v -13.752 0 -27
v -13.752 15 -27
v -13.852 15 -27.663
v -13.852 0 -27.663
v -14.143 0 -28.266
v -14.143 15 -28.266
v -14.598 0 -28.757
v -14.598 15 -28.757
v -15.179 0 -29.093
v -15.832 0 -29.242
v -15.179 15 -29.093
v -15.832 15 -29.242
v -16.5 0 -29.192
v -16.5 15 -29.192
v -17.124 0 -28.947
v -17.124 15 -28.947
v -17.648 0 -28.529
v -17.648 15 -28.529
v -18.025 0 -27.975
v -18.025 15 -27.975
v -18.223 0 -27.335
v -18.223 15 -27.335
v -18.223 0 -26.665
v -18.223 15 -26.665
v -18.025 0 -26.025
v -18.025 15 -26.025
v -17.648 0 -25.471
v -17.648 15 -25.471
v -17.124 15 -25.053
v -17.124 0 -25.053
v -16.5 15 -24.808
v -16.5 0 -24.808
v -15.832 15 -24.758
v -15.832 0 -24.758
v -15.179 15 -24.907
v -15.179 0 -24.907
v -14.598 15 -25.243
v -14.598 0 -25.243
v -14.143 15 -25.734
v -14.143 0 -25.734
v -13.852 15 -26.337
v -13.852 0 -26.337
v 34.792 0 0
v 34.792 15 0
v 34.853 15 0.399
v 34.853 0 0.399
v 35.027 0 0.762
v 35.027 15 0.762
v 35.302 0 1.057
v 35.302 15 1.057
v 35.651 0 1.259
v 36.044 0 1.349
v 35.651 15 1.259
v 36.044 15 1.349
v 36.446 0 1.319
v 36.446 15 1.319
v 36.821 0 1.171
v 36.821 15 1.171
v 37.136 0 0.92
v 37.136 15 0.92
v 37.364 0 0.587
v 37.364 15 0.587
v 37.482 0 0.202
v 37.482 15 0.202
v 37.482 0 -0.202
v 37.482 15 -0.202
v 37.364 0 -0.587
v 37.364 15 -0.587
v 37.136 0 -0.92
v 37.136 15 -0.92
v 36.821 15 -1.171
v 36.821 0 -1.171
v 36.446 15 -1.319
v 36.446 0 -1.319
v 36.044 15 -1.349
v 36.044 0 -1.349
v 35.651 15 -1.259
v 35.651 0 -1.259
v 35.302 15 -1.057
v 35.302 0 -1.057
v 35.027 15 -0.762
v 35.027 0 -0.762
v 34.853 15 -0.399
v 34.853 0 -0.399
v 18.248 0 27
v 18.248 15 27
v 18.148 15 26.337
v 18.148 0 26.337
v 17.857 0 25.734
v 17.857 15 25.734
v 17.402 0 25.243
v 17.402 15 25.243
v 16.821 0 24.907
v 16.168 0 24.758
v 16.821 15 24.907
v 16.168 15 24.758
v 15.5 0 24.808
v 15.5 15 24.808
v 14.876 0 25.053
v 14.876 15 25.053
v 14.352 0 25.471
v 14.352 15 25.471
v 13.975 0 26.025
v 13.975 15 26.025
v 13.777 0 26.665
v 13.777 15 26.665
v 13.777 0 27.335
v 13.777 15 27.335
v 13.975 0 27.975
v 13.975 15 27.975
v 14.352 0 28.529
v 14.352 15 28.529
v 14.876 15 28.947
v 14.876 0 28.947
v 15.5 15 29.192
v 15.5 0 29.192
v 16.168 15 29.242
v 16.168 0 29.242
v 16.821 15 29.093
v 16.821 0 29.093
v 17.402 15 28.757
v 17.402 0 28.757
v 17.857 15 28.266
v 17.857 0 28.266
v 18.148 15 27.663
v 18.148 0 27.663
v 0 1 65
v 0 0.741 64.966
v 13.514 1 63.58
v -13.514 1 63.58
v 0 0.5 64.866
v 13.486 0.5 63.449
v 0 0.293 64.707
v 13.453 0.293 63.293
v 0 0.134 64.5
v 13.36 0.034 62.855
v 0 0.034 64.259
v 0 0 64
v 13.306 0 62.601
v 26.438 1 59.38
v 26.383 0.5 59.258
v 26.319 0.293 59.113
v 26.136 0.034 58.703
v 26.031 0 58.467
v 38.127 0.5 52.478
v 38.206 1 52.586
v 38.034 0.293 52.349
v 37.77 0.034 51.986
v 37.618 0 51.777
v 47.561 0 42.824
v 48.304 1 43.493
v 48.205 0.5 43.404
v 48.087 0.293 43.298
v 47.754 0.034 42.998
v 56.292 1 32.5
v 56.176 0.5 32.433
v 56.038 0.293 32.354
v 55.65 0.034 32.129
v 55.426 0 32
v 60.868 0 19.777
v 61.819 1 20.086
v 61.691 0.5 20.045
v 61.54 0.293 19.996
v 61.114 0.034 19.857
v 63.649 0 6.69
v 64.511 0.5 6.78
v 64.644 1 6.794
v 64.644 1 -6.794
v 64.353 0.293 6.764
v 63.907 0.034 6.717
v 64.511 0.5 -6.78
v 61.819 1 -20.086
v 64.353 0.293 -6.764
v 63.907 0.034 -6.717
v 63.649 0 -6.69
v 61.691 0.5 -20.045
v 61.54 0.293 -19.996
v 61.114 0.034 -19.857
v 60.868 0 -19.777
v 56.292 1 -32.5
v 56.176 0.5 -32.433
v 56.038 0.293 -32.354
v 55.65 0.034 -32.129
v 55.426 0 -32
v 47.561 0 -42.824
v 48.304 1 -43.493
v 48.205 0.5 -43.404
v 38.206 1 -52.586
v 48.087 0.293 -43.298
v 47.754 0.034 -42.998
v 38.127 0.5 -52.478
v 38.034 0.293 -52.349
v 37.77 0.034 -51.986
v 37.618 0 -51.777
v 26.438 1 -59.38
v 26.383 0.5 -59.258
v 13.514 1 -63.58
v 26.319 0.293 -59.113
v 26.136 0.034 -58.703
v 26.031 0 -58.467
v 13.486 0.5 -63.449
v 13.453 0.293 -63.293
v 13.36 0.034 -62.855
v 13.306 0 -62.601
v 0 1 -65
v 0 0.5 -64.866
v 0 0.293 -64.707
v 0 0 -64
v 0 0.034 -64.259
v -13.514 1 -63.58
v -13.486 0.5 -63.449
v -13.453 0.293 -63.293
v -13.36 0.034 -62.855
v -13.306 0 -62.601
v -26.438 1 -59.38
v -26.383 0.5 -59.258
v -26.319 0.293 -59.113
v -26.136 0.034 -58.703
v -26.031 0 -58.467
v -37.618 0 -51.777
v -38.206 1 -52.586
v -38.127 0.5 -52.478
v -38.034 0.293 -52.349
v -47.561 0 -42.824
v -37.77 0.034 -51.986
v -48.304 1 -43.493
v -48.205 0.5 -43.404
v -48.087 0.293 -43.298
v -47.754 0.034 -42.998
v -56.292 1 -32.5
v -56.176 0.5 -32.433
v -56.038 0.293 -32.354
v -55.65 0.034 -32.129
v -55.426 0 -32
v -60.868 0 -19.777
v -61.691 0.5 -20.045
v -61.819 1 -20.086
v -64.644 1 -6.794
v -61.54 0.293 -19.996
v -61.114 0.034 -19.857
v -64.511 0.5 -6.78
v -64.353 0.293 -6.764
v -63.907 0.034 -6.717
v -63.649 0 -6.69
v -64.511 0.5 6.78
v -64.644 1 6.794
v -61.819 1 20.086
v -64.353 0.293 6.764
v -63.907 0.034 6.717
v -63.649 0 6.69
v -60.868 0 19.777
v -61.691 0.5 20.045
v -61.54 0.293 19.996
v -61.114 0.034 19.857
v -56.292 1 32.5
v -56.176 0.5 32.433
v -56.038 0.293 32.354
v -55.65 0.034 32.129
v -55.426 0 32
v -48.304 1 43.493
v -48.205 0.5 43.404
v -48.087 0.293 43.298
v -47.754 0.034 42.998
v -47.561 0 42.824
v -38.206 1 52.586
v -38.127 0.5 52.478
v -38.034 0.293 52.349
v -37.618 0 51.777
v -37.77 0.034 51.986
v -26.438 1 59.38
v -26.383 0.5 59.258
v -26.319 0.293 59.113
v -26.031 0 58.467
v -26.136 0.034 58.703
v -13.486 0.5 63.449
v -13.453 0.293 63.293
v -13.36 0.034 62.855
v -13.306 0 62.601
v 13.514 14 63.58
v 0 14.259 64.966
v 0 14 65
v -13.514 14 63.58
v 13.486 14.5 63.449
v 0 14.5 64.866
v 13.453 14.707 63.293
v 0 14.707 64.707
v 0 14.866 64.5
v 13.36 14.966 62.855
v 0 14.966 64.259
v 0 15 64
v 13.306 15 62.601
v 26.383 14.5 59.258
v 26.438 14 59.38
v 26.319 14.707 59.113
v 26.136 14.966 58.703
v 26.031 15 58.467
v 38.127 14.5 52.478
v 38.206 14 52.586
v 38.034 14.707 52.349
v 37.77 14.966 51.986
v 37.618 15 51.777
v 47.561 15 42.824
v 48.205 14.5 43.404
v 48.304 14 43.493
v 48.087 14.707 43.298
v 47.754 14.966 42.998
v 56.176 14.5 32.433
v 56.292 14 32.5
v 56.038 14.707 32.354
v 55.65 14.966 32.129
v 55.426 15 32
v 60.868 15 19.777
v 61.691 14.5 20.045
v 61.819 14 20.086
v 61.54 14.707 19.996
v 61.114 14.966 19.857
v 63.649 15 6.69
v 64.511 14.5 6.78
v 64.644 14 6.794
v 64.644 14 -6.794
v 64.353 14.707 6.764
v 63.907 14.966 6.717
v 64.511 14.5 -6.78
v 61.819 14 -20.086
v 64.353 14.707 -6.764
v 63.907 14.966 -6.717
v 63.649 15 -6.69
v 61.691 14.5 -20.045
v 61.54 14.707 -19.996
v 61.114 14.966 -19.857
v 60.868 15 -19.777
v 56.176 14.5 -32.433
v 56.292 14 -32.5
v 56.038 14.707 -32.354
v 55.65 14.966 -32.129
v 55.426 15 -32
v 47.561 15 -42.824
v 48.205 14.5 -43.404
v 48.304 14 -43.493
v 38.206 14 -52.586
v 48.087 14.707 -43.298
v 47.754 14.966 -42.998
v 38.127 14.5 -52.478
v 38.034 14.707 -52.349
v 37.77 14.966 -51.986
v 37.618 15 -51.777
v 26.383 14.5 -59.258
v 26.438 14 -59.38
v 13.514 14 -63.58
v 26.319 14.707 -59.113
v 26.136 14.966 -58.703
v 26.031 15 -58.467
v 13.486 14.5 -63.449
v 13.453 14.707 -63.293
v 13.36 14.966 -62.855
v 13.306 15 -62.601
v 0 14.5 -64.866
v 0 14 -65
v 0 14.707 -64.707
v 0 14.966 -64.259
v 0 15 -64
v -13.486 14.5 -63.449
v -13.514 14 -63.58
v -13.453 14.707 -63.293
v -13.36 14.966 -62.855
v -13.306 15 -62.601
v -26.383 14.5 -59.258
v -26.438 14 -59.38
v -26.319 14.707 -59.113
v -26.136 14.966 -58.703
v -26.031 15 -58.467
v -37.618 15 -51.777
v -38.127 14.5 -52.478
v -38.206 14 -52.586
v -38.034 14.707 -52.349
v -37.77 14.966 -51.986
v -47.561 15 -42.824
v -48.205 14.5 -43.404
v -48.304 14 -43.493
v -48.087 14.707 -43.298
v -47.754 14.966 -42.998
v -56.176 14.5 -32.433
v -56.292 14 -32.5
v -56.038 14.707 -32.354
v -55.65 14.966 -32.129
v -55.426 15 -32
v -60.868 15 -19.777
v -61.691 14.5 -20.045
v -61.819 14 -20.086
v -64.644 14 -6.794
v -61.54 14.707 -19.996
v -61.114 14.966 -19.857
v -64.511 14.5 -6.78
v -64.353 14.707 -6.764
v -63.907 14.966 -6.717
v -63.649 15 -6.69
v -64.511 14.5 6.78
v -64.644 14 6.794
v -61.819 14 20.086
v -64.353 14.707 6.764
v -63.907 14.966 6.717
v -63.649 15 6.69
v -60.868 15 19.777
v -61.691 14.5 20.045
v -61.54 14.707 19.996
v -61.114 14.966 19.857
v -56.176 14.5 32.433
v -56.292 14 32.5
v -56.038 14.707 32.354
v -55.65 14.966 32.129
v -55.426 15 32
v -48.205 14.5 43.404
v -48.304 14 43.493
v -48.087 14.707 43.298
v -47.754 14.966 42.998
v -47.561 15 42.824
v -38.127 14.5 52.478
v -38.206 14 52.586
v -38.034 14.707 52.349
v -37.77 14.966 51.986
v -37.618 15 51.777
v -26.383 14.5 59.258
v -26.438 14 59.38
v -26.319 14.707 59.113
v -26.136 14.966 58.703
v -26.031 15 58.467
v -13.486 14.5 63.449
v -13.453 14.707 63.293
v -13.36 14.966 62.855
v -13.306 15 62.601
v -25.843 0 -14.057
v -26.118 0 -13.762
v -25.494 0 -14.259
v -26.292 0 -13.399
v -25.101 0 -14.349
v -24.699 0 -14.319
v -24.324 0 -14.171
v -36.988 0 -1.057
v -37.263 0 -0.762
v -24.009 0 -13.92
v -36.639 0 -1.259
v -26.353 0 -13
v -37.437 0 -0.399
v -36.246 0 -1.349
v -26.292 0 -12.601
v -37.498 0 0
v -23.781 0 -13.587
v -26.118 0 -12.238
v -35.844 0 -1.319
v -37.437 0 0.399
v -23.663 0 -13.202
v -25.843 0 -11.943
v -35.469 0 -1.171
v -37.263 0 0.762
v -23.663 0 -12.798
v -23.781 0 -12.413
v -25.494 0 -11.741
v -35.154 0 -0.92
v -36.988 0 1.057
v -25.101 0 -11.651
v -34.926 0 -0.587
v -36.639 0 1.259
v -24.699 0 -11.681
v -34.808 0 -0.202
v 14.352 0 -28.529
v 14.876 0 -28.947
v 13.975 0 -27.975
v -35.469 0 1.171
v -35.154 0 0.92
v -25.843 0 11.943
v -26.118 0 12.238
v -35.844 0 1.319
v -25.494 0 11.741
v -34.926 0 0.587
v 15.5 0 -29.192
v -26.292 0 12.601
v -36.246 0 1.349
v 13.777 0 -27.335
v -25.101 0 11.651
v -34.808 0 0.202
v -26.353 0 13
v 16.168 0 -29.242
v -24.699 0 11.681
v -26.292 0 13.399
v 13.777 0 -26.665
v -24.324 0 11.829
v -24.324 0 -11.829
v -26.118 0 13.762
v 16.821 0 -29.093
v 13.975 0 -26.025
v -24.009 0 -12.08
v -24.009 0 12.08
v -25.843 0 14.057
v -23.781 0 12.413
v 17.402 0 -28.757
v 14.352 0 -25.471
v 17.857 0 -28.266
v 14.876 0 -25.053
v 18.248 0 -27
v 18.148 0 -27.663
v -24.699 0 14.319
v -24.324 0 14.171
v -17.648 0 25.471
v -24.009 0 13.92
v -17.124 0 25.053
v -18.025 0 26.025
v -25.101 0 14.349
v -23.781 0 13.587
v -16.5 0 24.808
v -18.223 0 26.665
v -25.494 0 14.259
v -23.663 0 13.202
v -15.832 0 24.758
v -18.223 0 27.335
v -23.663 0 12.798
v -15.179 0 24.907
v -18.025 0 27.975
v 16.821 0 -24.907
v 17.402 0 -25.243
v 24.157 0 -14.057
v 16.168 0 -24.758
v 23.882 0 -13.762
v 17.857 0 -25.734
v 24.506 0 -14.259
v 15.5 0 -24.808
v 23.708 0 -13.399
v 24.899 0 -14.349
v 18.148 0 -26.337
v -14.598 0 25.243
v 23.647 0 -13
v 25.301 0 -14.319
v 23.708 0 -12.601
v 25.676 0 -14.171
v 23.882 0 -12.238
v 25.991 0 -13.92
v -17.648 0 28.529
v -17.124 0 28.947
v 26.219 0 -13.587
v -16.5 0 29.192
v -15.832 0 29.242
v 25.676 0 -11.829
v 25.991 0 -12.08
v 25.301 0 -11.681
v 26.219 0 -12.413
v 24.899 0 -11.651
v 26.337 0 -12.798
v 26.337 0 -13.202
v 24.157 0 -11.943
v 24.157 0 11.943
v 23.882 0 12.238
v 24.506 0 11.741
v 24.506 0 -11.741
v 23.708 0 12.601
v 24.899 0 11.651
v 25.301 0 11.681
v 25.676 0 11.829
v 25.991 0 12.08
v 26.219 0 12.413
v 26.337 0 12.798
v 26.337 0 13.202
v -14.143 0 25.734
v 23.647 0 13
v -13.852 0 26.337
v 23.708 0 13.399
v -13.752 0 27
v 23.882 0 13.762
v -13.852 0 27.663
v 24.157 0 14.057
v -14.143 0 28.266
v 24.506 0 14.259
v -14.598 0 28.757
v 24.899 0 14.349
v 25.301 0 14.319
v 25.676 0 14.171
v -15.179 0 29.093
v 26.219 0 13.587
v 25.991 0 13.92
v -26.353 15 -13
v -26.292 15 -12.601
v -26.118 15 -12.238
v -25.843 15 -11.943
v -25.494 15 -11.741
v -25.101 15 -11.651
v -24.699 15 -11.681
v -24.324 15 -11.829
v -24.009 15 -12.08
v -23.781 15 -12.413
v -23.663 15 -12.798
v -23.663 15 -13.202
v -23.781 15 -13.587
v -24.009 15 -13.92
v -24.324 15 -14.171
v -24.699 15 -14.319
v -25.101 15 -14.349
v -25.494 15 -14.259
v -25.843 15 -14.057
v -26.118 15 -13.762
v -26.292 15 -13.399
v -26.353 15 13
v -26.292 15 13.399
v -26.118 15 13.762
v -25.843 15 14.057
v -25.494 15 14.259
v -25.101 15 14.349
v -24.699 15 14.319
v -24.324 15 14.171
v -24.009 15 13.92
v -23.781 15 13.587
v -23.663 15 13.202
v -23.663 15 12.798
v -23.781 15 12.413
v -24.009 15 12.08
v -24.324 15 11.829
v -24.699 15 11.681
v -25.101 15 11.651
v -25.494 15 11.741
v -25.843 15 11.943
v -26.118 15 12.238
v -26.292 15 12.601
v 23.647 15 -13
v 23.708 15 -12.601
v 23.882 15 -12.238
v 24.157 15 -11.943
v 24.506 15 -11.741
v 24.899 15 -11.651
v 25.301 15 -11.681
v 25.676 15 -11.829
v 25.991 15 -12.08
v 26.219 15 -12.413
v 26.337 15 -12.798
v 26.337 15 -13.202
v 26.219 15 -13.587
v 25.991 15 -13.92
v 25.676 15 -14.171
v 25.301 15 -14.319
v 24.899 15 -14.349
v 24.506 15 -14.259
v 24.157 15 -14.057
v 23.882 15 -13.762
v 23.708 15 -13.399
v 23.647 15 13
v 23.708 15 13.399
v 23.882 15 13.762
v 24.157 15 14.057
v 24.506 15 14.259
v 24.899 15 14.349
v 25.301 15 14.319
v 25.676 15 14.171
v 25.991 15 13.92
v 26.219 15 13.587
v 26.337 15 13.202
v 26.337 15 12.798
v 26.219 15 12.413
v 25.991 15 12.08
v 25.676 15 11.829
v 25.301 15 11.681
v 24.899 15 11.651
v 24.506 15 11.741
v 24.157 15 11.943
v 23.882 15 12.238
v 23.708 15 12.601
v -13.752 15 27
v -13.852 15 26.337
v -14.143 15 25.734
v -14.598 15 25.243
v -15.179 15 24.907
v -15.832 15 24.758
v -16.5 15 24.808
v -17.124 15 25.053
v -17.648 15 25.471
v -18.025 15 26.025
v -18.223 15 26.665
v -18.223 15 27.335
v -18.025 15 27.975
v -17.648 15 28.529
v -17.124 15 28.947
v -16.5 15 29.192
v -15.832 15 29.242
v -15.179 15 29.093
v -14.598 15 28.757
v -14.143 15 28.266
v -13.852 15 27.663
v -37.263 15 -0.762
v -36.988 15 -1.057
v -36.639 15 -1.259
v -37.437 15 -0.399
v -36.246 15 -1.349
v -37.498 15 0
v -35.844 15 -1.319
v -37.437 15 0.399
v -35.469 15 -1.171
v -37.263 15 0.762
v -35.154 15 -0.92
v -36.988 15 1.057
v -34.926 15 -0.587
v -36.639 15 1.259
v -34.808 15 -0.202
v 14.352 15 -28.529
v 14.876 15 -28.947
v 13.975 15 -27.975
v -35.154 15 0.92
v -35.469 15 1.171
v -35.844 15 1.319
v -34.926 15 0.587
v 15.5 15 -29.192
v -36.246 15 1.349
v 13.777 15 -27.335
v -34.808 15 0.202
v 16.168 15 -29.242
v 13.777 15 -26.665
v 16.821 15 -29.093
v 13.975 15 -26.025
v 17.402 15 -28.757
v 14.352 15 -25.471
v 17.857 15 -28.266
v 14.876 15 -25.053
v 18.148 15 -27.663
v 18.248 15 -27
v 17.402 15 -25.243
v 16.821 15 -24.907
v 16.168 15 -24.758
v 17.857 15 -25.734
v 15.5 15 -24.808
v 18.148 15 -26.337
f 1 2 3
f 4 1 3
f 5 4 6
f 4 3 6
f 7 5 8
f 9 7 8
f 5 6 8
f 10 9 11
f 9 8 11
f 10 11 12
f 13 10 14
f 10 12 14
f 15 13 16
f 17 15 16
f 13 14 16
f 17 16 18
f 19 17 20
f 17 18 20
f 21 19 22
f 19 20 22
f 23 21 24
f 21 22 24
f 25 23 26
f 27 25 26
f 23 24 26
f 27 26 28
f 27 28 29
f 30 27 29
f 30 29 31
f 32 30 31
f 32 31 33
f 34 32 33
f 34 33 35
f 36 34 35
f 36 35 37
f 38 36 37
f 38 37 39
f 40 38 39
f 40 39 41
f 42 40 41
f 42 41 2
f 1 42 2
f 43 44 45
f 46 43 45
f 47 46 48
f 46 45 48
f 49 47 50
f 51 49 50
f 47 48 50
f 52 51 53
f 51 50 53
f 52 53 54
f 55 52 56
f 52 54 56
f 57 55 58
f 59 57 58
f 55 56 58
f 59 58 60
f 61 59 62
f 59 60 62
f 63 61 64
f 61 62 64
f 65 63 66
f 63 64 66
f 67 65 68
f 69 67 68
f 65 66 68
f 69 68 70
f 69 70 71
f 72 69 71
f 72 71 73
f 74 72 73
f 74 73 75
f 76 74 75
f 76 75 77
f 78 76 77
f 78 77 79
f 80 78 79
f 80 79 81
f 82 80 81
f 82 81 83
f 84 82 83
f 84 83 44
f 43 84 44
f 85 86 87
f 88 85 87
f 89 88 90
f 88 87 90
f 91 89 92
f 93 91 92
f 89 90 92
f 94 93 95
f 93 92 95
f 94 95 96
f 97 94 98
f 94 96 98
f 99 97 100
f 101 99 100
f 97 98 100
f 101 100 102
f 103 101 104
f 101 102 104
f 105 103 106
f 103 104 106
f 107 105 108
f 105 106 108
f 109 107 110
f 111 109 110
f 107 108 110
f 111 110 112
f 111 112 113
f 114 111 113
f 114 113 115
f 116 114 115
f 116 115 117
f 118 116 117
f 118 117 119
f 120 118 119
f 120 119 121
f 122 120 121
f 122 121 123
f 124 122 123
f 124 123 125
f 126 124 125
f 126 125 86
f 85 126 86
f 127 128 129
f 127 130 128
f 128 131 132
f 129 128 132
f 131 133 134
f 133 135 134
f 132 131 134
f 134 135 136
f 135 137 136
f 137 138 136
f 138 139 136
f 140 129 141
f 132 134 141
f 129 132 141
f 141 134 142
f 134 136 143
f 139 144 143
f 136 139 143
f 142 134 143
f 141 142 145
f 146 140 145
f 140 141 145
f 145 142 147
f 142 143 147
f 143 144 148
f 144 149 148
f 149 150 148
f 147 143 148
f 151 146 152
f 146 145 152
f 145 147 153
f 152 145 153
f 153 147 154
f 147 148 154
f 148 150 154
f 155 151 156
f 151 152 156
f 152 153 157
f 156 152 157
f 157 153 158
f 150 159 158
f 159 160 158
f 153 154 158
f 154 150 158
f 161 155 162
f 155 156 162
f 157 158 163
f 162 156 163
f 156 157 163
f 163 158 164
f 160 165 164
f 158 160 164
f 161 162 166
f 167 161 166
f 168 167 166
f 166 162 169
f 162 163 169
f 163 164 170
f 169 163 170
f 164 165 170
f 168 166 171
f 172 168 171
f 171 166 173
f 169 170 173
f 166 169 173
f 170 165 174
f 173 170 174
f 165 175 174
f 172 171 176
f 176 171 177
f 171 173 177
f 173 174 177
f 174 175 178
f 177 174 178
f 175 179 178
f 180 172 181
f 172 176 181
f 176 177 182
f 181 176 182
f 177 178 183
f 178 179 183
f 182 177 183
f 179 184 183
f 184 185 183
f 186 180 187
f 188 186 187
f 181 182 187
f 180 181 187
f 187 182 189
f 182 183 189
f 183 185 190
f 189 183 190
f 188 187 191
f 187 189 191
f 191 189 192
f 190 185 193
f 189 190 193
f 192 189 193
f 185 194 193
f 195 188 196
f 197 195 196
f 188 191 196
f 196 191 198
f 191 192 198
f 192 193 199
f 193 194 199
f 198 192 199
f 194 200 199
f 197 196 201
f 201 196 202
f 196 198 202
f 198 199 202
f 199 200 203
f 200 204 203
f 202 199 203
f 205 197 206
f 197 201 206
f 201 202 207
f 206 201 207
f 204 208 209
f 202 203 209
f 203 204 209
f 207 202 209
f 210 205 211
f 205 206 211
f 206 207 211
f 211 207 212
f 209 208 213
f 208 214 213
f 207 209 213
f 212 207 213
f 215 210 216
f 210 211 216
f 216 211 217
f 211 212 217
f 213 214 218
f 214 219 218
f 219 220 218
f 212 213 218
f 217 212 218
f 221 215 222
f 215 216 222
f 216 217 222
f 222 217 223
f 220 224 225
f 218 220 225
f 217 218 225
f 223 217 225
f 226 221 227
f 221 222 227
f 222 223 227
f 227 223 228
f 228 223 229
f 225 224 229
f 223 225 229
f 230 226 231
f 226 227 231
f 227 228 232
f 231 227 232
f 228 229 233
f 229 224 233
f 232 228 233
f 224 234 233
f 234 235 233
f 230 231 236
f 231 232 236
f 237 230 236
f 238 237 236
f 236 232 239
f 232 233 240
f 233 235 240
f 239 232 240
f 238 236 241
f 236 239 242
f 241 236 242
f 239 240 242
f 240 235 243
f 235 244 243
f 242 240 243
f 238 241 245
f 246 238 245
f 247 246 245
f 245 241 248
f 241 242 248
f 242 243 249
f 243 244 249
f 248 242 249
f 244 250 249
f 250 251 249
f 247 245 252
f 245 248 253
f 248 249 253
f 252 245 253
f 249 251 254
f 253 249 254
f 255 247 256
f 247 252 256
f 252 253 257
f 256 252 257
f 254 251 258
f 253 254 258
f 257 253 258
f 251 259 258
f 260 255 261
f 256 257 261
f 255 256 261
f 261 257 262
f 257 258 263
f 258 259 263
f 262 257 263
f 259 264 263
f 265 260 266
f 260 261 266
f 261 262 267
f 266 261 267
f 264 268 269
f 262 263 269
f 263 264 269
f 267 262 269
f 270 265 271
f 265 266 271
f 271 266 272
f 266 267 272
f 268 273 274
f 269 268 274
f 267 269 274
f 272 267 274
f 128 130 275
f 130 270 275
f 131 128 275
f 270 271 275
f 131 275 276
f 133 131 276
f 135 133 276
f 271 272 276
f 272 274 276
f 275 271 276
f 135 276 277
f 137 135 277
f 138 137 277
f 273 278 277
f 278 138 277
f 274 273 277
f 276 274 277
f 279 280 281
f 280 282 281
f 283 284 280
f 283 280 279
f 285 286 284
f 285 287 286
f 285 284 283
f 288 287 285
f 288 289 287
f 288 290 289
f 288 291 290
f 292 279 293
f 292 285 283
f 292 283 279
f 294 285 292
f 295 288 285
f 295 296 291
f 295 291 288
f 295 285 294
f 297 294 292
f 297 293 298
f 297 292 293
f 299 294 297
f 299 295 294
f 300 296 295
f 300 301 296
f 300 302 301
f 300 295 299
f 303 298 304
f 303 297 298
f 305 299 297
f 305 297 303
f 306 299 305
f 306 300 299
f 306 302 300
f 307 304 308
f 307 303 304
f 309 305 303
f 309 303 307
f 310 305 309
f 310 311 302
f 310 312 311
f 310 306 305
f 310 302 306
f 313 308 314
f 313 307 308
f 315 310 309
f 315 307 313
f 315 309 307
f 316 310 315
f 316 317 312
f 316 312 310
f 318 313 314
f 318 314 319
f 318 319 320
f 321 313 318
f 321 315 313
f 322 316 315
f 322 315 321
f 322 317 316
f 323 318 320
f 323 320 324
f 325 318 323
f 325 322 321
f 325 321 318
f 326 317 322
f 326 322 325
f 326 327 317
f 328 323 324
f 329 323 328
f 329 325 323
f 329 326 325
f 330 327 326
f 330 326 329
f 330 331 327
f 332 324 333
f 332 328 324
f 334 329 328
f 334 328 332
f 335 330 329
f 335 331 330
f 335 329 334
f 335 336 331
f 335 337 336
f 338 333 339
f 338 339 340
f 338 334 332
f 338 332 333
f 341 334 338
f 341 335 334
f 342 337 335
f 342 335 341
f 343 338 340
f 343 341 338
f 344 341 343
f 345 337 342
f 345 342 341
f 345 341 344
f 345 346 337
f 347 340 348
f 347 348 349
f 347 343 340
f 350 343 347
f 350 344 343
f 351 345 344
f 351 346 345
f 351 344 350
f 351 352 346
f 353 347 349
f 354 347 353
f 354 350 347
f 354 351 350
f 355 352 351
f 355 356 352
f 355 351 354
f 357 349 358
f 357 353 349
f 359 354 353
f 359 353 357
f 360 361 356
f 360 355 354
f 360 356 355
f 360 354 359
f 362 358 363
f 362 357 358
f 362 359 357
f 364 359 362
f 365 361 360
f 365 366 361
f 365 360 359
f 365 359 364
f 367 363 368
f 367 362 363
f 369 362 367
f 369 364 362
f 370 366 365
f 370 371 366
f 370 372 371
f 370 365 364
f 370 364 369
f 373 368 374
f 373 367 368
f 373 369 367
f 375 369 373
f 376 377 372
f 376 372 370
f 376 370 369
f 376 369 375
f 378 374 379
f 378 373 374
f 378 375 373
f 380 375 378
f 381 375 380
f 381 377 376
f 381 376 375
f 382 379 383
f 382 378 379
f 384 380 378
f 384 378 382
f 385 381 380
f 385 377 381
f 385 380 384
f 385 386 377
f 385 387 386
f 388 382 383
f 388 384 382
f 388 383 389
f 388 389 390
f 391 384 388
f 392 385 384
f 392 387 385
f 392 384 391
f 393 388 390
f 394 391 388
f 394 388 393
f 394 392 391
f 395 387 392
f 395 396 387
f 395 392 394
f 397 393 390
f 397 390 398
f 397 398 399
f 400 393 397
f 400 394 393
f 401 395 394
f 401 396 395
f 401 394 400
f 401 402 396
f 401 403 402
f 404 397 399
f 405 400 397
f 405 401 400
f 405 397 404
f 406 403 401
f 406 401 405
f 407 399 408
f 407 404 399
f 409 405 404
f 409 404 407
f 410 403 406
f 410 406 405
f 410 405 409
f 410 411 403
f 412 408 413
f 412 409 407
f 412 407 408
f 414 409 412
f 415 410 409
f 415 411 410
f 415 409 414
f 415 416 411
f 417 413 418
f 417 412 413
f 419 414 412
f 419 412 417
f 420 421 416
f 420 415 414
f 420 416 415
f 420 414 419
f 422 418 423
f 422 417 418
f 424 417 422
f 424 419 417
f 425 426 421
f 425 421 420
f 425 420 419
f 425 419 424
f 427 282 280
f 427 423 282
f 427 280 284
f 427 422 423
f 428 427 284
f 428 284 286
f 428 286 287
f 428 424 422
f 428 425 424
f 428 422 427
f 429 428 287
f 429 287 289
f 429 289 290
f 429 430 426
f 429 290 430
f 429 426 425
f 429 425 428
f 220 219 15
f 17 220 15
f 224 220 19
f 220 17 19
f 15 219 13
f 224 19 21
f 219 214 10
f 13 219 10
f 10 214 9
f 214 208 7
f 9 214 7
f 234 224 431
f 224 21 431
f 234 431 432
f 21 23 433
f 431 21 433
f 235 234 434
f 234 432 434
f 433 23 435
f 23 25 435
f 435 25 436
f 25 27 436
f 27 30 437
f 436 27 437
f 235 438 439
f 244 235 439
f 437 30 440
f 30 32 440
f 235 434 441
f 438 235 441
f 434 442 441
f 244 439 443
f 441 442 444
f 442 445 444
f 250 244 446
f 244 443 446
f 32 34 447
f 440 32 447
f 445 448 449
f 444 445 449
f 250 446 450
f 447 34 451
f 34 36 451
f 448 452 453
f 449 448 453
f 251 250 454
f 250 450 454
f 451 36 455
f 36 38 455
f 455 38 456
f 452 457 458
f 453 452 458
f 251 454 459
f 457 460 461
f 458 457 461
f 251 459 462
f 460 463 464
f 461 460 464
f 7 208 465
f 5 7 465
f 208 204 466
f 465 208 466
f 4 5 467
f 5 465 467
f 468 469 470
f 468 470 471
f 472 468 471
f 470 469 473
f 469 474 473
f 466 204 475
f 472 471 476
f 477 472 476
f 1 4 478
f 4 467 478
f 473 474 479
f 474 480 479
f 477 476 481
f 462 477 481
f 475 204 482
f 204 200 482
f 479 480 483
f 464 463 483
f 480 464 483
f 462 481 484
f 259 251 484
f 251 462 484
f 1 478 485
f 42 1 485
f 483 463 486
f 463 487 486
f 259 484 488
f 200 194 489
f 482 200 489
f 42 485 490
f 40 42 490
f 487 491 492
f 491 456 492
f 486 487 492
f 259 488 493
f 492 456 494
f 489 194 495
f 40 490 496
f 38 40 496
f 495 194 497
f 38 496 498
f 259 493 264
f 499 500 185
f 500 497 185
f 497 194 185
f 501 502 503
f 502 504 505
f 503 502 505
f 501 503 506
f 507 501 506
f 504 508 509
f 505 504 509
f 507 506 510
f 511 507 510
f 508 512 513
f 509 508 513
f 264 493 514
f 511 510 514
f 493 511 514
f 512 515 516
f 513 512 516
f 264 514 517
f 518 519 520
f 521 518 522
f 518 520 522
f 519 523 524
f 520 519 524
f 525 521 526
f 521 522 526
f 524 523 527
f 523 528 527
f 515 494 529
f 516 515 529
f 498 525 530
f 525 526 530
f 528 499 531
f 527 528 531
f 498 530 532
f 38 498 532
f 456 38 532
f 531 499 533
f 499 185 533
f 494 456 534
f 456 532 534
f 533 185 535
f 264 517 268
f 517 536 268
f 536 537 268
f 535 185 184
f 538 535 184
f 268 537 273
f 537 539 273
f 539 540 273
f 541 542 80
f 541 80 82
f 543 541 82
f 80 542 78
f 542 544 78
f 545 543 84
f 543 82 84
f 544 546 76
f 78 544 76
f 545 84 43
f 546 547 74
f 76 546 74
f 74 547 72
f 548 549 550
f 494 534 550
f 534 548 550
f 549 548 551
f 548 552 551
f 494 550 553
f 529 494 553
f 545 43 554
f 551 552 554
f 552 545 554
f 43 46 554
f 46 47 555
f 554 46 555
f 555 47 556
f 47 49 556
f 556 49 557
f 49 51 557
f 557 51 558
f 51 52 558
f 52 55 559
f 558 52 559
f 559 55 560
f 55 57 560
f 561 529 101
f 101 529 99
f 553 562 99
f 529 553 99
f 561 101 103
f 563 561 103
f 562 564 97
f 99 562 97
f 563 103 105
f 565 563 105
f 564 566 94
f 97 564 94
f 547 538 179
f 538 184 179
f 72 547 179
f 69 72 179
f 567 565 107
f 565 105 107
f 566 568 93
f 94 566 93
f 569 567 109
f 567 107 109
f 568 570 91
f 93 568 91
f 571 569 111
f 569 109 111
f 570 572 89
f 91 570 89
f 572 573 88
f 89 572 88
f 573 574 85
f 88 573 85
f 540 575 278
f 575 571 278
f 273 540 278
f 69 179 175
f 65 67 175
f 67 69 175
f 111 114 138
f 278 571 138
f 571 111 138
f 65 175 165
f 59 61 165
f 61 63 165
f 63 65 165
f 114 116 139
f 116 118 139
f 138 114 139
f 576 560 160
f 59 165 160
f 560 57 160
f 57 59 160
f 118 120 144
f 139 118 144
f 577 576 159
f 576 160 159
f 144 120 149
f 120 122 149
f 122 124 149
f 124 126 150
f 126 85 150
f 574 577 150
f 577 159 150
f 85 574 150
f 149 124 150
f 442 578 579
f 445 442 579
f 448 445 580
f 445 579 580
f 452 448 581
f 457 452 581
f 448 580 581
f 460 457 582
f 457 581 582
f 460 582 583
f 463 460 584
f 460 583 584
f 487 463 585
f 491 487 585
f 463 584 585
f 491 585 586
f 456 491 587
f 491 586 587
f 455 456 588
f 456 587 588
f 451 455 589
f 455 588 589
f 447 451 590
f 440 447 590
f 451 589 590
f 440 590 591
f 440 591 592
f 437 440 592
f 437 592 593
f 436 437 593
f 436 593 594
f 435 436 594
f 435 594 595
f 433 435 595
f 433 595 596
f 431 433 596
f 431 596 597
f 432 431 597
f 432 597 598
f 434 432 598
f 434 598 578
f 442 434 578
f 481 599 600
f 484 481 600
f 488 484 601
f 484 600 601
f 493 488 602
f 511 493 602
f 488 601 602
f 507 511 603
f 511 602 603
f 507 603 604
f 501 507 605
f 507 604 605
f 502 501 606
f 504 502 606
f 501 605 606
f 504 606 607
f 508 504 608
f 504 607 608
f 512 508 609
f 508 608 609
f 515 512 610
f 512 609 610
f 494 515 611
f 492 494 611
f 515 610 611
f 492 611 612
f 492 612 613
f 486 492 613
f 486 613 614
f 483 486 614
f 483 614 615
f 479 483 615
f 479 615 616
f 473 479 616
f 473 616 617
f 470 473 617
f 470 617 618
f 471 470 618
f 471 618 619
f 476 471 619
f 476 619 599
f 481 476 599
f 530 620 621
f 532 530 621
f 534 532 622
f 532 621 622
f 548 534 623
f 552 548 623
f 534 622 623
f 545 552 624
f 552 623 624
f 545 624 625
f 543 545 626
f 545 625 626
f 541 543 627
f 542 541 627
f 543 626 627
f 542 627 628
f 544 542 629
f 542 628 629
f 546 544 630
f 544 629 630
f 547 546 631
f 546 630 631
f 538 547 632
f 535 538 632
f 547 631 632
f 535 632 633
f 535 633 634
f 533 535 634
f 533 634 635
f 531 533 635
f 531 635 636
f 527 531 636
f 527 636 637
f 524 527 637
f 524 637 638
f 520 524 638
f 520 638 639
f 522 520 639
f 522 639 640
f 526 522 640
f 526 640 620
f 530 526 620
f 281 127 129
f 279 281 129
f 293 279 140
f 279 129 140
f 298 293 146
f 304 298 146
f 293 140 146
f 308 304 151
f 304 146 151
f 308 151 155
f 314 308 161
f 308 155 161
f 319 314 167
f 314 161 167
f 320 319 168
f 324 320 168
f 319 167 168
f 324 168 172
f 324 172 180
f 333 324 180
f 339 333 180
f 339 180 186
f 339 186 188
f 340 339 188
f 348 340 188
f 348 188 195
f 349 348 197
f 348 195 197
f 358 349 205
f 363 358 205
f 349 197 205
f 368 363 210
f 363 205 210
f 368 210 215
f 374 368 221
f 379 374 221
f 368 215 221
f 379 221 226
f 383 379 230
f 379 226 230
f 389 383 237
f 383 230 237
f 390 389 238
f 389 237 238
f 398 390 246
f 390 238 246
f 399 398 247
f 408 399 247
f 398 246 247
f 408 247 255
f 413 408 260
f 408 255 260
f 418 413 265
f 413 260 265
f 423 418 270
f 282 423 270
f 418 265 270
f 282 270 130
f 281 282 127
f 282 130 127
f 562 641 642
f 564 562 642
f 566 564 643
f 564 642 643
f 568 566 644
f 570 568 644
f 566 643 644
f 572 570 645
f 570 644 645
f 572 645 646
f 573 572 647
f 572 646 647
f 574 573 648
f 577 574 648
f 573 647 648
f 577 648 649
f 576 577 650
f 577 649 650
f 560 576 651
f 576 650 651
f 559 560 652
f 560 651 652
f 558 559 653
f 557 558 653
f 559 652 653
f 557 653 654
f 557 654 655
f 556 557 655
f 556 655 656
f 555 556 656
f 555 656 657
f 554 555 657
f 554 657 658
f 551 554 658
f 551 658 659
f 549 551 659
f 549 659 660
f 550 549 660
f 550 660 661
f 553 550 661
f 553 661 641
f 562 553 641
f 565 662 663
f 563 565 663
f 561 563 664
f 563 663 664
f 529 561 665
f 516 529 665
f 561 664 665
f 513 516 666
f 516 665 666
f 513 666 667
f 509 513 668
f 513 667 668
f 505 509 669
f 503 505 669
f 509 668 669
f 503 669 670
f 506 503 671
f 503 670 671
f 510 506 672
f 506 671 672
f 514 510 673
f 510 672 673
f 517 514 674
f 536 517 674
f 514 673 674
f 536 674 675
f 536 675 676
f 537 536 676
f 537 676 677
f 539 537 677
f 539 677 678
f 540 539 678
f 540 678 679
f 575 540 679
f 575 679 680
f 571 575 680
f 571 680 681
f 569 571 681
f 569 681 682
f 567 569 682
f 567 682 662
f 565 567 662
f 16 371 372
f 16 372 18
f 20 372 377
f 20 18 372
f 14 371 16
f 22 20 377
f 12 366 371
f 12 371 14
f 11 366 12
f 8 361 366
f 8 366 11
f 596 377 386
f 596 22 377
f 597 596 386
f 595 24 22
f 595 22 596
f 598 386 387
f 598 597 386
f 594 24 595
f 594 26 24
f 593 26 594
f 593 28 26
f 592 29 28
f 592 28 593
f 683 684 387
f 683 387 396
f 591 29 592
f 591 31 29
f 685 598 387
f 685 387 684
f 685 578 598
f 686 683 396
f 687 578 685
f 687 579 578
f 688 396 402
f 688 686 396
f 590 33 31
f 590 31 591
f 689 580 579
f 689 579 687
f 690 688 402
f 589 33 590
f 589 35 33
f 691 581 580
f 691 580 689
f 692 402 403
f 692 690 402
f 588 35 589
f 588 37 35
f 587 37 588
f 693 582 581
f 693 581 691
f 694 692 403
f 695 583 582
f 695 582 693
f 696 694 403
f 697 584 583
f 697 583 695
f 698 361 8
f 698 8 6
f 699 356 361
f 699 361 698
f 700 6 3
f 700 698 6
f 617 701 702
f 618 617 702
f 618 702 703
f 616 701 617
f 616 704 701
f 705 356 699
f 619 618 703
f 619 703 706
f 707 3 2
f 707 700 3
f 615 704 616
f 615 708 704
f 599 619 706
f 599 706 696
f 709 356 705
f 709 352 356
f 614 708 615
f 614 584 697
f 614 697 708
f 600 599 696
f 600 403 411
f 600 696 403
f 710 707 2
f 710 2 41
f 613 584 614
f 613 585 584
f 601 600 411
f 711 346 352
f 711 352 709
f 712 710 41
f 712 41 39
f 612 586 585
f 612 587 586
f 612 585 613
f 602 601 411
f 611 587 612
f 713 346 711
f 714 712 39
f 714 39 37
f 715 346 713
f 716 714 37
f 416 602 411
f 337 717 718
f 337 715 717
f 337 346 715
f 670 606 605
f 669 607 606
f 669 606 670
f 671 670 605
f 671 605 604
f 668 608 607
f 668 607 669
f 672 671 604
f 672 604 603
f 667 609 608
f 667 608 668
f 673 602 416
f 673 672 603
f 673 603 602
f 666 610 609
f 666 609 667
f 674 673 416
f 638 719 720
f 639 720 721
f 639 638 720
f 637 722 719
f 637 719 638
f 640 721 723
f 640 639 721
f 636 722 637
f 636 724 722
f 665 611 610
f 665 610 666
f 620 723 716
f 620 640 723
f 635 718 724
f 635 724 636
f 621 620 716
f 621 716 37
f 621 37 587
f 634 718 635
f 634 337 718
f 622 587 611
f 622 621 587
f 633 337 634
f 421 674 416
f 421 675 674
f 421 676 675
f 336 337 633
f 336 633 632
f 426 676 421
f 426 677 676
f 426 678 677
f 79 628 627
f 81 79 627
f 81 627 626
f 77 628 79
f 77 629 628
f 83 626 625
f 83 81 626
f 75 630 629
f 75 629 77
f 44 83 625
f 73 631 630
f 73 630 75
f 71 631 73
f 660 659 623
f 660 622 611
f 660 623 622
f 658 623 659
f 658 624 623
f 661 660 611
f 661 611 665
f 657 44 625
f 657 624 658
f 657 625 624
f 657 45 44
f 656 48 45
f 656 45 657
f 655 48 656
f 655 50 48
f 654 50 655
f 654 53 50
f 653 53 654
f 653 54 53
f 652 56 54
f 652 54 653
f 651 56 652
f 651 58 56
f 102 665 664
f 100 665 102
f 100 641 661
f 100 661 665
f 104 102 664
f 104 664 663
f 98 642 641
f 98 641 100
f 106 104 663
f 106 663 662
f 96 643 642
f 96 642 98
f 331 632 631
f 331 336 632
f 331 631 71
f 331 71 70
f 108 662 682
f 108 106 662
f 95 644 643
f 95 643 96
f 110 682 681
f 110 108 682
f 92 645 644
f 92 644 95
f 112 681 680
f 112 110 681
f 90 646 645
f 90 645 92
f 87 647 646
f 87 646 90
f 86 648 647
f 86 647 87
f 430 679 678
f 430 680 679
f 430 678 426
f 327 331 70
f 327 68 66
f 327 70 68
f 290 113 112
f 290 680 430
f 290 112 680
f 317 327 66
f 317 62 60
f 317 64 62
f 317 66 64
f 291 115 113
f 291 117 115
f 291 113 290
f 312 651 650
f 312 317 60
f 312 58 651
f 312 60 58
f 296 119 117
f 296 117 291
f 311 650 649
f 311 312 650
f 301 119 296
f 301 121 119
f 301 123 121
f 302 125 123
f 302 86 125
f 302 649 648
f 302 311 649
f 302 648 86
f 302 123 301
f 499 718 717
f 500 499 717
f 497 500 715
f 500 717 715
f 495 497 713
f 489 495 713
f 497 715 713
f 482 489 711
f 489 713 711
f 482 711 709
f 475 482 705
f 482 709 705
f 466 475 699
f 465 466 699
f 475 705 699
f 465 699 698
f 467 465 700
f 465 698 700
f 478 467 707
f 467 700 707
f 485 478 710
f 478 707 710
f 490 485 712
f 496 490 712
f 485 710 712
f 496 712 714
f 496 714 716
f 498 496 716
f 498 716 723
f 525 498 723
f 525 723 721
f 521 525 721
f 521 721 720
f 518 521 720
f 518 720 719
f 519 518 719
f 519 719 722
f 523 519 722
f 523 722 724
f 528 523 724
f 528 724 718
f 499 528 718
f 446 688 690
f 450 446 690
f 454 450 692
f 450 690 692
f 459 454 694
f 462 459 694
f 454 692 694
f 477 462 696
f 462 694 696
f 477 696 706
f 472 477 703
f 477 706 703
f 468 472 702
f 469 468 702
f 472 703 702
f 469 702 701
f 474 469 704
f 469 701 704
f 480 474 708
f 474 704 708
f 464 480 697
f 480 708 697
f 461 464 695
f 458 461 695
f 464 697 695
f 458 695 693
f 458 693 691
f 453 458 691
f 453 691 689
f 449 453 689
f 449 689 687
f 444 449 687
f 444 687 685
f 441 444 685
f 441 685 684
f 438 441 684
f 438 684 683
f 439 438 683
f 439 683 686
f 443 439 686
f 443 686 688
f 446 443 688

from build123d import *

# Parameters (mm, degrees)
SKETCH1_R             = 65
BOSS_EXTRUDE1_DEPTH   = 15
FILLET1_R             = 1
F_6_32_TAPPED_HOLE1_D = 2.7051
F_8_CLEARANCE_HOLE1_D = 4.4958


with BuildPart() as part:
    # Sketch1 → Boss-Extrude1 (new body)
    with BuildSketch(Plane(origin=(0, 0, 0), x_dir=(1, 0, 0), z_dir=(0, 1, 0))):
        with Locations(Location((0, 0, 0), (0, 0, 270))):
            Circle(SKETCH1_R)
    extrude(amount=BOSS_EXTRUDE1_DEPTH)

    # Fillet1
    fillet1_edges = [part.edges().sort_by_distance(p)[0] for p in [
        (0, 0, -65),
        (0, 15, -65),
    ]]
    fillet(fillet1_edges, radius=FILLET1_R)

    # #6-32 Tapped Hole1 (through all)
    with Locations(Plane.XZ):
        with Locations((-36.145, 0), (36.145, 0), (-25, -13), (-25, 13), (25, 13), (25, -13)):
            Hole(F_6_32_TAPPED_HOLE1_D / 2)

    # #8 Clearance Hole1 (through all)
    with Locations(Plane(origin=(0, 0, 0), x_dir=(-1, 0, 0), z_dir=(0, -1, 0))):
        with Locations((16, -27), (-16, -27), (16, 27), (-16, 27)):
            Hole(F_8_CLEARANCE_HOLE1_D / 2)


solid = part.part
